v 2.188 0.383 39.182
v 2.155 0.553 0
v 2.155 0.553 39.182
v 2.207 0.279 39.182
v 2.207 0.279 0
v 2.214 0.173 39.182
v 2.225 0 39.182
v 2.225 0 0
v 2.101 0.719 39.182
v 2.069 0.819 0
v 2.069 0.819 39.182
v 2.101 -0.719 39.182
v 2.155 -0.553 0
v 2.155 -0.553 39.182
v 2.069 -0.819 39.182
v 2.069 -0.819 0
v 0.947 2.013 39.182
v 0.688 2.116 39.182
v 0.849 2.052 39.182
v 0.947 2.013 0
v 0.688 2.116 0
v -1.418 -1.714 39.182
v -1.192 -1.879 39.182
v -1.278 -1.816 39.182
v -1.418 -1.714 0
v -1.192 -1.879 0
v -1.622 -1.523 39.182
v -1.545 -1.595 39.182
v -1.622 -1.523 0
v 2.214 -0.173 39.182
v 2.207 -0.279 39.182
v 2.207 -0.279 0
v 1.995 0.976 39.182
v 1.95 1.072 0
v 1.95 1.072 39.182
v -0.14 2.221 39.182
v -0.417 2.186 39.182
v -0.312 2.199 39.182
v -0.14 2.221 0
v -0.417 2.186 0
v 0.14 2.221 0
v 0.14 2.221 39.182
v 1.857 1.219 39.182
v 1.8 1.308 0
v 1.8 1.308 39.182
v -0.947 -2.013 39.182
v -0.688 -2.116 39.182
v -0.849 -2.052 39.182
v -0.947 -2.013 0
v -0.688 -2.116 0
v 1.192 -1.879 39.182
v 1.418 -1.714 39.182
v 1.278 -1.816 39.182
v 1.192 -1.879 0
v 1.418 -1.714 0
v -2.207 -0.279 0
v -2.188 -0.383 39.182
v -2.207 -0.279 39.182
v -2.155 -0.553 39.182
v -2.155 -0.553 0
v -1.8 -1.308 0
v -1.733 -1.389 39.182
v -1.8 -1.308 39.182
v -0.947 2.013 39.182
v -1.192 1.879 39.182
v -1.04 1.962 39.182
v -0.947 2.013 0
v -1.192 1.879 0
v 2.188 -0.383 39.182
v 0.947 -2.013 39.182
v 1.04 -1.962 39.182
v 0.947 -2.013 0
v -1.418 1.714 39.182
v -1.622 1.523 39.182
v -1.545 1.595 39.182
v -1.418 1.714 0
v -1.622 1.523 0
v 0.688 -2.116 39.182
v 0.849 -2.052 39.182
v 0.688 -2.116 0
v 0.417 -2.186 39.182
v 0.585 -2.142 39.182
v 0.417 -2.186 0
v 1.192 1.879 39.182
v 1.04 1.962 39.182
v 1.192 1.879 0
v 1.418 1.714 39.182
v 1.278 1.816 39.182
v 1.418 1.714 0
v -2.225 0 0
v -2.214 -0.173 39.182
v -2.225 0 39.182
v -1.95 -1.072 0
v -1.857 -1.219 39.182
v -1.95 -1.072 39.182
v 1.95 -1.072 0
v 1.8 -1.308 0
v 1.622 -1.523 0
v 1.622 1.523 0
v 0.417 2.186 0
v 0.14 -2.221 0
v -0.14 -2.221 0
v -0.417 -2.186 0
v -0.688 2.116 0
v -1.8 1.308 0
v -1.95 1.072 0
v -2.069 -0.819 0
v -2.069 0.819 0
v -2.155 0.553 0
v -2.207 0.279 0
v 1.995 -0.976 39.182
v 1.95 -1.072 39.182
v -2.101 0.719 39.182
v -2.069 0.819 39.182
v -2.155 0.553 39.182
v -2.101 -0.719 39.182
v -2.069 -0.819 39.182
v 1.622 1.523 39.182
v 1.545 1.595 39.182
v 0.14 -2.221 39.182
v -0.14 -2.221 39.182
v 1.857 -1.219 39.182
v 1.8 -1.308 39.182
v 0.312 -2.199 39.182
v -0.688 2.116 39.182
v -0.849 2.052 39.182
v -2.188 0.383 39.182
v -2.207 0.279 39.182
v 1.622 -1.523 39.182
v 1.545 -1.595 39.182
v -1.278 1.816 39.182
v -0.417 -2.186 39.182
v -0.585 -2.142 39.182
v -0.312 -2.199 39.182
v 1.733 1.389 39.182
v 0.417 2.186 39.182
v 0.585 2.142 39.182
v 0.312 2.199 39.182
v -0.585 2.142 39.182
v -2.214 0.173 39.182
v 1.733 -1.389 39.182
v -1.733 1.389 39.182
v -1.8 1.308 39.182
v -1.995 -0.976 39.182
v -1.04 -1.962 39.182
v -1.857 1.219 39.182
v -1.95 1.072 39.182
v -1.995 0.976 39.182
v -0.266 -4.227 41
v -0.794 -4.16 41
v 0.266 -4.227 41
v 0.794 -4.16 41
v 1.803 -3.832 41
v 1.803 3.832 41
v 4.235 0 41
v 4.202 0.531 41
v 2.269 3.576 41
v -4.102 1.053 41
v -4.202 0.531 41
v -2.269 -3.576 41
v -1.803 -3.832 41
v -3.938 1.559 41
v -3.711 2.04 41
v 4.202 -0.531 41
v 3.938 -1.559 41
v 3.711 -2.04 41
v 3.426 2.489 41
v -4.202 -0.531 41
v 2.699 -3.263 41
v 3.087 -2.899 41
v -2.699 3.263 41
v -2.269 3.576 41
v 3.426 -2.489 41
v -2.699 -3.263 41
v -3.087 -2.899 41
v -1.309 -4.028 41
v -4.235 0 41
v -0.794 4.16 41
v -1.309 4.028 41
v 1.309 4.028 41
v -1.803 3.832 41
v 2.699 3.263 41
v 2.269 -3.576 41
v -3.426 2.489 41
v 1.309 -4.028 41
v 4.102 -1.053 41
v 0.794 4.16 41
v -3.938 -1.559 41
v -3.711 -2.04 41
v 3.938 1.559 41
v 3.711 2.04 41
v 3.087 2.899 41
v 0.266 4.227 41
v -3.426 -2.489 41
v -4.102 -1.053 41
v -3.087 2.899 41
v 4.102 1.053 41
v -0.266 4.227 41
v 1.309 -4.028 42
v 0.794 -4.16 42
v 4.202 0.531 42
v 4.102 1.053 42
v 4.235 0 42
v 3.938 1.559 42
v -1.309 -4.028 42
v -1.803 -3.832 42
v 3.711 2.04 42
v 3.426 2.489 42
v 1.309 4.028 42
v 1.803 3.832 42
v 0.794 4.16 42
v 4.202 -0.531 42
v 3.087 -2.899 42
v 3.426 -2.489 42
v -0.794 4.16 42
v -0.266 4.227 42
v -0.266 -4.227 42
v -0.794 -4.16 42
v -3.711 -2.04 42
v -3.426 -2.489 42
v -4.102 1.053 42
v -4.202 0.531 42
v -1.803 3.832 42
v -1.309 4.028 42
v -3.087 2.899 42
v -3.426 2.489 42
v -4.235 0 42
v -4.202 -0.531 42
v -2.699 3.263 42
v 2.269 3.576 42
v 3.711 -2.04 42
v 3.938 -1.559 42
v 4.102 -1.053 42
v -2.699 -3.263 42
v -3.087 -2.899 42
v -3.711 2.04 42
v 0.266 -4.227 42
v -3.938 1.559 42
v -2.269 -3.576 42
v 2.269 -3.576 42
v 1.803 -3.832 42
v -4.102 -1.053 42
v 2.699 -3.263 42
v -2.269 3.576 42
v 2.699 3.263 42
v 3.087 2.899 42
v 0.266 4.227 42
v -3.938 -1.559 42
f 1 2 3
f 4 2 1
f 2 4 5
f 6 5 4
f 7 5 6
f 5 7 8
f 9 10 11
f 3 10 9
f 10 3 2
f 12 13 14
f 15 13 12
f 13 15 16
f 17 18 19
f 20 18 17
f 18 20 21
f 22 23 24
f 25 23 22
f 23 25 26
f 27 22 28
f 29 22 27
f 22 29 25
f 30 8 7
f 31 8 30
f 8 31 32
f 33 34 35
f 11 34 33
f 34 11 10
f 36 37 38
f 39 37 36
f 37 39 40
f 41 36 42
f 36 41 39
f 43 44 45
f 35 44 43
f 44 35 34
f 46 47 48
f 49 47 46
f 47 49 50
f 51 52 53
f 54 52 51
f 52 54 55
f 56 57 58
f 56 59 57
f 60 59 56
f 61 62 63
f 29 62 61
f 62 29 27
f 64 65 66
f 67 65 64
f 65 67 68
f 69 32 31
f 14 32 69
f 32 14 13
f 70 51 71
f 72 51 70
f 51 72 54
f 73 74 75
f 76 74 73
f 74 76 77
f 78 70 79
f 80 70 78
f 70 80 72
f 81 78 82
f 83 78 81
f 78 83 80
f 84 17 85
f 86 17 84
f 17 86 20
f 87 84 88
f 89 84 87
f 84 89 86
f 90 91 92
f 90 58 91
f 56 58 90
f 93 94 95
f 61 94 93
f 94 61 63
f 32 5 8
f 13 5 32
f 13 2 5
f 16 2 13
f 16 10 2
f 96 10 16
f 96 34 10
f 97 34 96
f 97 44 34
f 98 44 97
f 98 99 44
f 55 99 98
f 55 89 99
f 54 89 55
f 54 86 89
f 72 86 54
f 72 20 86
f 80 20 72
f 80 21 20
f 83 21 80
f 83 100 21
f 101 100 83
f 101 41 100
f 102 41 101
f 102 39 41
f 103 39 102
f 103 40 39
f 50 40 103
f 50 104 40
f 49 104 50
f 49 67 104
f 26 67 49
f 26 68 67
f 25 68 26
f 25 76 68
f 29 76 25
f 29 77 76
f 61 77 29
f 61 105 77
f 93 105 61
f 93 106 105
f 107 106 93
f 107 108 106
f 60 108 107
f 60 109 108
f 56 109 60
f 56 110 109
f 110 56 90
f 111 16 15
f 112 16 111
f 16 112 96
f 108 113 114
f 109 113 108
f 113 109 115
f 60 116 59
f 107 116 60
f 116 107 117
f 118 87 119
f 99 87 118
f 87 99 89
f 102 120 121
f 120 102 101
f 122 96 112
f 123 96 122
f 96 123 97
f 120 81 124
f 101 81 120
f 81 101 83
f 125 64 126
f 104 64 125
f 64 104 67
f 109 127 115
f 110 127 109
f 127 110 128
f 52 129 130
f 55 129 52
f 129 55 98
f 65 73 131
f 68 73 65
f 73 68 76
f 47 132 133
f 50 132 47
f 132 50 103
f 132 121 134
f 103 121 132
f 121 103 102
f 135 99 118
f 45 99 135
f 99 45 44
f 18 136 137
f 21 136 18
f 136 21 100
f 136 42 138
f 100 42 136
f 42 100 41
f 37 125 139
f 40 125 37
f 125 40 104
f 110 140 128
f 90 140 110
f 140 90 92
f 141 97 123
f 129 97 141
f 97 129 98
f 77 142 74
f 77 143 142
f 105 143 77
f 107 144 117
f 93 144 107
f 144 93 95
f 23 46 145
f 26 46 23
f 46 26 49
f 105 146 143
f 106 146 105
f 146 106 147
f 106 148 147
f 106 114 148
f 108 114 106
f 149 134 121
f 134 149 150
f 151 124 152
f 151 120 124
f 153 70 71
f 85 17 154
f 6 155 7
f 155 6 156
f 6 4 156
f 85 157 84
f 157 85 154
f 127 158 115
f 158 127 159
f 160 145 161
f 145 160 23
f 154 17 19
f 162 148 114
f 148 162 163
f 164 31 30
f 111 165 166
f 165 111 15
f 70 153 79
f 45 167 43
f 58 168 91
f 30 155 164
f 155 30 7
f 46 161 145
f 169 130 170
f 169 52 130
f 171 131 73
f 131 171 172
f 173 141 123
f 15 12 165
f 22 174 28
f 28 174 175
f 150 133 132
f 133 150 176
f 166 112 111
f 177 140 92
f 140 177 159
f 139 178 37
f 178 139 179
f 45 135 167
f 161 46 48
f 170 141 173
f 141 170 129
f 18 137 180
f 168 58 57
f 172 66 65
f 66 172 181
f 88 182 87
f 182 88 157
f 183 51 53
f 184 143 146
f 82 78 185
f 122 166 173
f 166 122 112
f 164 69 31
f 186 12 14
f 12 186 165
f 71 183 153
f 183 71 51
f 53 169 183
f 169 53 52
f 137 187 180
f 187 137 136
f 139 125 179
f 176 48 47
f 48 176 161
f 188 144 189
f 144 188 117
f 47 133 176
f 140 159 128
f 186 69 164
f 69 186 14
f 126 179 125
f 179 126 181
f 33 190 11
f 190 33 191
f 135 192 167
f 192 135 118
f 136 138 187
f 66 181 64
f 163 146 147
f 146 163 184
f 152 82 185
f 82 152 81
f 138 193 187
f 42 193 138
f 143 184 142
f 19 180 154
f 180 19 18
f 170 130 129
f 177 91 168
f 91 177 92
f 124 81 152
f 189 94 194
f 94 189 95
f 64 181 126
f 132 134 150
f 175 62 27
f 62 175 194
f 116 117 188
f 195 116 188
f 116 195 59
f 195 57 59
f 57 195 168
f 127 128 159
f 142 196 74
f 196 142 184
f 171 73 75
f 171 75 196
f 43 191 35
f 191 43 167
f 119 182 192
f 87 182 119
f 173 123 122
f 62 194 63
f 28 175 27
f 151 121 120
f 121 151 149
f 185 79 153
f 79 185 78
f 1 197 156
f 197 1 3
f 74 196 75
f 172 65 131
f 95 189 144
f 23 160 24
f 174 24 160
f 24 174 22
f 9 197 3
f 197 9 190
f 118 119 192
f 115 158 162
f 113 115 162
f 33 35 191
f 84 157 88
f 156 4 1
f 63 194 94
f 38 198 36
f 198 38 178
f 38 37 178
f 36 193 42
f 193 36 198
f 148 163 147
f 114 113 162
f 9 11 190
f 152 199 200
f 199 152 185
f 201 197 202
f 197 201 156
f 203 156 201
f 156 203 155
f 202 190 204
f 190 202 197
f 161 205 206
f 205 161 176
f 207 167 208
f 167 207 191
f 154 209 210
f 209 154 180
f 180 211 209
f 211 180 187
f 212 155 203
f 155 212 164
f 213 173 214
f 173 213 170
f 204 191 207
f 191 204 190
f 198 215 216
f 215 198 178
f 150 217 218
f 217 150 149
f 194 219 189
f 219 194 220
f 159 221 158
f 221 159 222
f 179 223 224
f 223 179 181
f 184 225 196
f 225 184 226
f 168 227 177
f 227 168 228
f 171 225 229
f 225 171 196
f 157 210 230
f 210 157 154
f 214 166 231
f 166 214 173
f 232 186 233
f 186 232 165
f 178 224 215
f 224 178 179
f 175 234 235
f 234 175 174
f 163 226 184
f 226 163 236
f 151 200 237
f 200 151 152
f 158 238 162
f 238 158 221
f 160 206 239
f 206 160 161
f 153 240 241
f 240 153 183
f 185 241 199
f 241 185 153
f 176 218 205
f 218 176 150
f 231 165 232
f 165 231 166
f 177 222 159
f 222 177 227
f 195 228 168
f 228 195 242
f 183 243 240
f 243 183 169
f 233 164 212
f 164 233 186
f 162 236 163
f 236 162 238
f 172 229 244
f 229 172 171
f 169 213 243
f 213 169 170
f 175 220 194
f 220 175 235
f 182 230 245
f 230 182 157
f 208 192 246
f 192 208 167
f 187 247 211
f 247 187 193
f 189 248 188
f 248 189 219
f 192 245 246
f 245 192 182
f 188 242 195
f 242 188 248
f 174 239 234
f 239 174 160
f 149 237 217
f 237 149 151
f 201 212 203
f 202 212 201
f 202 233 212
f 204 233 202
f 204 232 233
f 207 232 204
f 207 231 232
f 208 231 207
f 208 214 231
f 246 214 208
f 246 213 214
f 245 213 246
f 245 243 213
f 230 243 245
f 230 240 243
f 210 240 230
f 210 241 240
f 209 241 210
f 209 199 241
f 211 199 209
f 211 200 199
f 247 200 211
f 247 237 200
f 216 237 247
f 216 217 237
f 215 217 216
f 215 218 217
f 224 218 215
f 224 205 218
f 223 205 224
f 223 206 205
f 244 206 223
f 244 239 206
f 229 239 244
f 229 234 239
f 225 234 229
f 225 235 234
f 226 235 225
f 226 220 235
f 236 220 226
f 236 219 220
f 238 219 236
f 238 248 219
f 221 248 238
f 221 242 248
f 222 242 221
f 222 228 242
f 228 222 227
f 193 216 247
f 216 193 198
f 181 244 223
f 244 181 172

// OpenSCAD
//the wood screw used in the wormtown extruder.

$fn=50;

screwlength=41;
threadlength=35;
shanklength=3.3;
headlength=screwlength-threadlength-shanklength;
echo ("headlength is", headlength);
threaddiam=4.45;
threadrad=threaddiam/2;
shankdiam=2.5;
shankrad=shankdiam/2;
headdiam=8.47;
headrad=headdiam/2;


module woodscrew(3dprintertolerance=.4){
	union(){
		cylinder(h=screwlength,r=threadrad);
		translate([0,0,threadlength+shanklength]){
			cylinder(headlength,d1=shankdiam,d2=headdiam);
			}
		translate([0,0,screwlength]){
			cylinder(h=1,d=headdiam);
		}
	}
}


woodscrew(.4);
	
